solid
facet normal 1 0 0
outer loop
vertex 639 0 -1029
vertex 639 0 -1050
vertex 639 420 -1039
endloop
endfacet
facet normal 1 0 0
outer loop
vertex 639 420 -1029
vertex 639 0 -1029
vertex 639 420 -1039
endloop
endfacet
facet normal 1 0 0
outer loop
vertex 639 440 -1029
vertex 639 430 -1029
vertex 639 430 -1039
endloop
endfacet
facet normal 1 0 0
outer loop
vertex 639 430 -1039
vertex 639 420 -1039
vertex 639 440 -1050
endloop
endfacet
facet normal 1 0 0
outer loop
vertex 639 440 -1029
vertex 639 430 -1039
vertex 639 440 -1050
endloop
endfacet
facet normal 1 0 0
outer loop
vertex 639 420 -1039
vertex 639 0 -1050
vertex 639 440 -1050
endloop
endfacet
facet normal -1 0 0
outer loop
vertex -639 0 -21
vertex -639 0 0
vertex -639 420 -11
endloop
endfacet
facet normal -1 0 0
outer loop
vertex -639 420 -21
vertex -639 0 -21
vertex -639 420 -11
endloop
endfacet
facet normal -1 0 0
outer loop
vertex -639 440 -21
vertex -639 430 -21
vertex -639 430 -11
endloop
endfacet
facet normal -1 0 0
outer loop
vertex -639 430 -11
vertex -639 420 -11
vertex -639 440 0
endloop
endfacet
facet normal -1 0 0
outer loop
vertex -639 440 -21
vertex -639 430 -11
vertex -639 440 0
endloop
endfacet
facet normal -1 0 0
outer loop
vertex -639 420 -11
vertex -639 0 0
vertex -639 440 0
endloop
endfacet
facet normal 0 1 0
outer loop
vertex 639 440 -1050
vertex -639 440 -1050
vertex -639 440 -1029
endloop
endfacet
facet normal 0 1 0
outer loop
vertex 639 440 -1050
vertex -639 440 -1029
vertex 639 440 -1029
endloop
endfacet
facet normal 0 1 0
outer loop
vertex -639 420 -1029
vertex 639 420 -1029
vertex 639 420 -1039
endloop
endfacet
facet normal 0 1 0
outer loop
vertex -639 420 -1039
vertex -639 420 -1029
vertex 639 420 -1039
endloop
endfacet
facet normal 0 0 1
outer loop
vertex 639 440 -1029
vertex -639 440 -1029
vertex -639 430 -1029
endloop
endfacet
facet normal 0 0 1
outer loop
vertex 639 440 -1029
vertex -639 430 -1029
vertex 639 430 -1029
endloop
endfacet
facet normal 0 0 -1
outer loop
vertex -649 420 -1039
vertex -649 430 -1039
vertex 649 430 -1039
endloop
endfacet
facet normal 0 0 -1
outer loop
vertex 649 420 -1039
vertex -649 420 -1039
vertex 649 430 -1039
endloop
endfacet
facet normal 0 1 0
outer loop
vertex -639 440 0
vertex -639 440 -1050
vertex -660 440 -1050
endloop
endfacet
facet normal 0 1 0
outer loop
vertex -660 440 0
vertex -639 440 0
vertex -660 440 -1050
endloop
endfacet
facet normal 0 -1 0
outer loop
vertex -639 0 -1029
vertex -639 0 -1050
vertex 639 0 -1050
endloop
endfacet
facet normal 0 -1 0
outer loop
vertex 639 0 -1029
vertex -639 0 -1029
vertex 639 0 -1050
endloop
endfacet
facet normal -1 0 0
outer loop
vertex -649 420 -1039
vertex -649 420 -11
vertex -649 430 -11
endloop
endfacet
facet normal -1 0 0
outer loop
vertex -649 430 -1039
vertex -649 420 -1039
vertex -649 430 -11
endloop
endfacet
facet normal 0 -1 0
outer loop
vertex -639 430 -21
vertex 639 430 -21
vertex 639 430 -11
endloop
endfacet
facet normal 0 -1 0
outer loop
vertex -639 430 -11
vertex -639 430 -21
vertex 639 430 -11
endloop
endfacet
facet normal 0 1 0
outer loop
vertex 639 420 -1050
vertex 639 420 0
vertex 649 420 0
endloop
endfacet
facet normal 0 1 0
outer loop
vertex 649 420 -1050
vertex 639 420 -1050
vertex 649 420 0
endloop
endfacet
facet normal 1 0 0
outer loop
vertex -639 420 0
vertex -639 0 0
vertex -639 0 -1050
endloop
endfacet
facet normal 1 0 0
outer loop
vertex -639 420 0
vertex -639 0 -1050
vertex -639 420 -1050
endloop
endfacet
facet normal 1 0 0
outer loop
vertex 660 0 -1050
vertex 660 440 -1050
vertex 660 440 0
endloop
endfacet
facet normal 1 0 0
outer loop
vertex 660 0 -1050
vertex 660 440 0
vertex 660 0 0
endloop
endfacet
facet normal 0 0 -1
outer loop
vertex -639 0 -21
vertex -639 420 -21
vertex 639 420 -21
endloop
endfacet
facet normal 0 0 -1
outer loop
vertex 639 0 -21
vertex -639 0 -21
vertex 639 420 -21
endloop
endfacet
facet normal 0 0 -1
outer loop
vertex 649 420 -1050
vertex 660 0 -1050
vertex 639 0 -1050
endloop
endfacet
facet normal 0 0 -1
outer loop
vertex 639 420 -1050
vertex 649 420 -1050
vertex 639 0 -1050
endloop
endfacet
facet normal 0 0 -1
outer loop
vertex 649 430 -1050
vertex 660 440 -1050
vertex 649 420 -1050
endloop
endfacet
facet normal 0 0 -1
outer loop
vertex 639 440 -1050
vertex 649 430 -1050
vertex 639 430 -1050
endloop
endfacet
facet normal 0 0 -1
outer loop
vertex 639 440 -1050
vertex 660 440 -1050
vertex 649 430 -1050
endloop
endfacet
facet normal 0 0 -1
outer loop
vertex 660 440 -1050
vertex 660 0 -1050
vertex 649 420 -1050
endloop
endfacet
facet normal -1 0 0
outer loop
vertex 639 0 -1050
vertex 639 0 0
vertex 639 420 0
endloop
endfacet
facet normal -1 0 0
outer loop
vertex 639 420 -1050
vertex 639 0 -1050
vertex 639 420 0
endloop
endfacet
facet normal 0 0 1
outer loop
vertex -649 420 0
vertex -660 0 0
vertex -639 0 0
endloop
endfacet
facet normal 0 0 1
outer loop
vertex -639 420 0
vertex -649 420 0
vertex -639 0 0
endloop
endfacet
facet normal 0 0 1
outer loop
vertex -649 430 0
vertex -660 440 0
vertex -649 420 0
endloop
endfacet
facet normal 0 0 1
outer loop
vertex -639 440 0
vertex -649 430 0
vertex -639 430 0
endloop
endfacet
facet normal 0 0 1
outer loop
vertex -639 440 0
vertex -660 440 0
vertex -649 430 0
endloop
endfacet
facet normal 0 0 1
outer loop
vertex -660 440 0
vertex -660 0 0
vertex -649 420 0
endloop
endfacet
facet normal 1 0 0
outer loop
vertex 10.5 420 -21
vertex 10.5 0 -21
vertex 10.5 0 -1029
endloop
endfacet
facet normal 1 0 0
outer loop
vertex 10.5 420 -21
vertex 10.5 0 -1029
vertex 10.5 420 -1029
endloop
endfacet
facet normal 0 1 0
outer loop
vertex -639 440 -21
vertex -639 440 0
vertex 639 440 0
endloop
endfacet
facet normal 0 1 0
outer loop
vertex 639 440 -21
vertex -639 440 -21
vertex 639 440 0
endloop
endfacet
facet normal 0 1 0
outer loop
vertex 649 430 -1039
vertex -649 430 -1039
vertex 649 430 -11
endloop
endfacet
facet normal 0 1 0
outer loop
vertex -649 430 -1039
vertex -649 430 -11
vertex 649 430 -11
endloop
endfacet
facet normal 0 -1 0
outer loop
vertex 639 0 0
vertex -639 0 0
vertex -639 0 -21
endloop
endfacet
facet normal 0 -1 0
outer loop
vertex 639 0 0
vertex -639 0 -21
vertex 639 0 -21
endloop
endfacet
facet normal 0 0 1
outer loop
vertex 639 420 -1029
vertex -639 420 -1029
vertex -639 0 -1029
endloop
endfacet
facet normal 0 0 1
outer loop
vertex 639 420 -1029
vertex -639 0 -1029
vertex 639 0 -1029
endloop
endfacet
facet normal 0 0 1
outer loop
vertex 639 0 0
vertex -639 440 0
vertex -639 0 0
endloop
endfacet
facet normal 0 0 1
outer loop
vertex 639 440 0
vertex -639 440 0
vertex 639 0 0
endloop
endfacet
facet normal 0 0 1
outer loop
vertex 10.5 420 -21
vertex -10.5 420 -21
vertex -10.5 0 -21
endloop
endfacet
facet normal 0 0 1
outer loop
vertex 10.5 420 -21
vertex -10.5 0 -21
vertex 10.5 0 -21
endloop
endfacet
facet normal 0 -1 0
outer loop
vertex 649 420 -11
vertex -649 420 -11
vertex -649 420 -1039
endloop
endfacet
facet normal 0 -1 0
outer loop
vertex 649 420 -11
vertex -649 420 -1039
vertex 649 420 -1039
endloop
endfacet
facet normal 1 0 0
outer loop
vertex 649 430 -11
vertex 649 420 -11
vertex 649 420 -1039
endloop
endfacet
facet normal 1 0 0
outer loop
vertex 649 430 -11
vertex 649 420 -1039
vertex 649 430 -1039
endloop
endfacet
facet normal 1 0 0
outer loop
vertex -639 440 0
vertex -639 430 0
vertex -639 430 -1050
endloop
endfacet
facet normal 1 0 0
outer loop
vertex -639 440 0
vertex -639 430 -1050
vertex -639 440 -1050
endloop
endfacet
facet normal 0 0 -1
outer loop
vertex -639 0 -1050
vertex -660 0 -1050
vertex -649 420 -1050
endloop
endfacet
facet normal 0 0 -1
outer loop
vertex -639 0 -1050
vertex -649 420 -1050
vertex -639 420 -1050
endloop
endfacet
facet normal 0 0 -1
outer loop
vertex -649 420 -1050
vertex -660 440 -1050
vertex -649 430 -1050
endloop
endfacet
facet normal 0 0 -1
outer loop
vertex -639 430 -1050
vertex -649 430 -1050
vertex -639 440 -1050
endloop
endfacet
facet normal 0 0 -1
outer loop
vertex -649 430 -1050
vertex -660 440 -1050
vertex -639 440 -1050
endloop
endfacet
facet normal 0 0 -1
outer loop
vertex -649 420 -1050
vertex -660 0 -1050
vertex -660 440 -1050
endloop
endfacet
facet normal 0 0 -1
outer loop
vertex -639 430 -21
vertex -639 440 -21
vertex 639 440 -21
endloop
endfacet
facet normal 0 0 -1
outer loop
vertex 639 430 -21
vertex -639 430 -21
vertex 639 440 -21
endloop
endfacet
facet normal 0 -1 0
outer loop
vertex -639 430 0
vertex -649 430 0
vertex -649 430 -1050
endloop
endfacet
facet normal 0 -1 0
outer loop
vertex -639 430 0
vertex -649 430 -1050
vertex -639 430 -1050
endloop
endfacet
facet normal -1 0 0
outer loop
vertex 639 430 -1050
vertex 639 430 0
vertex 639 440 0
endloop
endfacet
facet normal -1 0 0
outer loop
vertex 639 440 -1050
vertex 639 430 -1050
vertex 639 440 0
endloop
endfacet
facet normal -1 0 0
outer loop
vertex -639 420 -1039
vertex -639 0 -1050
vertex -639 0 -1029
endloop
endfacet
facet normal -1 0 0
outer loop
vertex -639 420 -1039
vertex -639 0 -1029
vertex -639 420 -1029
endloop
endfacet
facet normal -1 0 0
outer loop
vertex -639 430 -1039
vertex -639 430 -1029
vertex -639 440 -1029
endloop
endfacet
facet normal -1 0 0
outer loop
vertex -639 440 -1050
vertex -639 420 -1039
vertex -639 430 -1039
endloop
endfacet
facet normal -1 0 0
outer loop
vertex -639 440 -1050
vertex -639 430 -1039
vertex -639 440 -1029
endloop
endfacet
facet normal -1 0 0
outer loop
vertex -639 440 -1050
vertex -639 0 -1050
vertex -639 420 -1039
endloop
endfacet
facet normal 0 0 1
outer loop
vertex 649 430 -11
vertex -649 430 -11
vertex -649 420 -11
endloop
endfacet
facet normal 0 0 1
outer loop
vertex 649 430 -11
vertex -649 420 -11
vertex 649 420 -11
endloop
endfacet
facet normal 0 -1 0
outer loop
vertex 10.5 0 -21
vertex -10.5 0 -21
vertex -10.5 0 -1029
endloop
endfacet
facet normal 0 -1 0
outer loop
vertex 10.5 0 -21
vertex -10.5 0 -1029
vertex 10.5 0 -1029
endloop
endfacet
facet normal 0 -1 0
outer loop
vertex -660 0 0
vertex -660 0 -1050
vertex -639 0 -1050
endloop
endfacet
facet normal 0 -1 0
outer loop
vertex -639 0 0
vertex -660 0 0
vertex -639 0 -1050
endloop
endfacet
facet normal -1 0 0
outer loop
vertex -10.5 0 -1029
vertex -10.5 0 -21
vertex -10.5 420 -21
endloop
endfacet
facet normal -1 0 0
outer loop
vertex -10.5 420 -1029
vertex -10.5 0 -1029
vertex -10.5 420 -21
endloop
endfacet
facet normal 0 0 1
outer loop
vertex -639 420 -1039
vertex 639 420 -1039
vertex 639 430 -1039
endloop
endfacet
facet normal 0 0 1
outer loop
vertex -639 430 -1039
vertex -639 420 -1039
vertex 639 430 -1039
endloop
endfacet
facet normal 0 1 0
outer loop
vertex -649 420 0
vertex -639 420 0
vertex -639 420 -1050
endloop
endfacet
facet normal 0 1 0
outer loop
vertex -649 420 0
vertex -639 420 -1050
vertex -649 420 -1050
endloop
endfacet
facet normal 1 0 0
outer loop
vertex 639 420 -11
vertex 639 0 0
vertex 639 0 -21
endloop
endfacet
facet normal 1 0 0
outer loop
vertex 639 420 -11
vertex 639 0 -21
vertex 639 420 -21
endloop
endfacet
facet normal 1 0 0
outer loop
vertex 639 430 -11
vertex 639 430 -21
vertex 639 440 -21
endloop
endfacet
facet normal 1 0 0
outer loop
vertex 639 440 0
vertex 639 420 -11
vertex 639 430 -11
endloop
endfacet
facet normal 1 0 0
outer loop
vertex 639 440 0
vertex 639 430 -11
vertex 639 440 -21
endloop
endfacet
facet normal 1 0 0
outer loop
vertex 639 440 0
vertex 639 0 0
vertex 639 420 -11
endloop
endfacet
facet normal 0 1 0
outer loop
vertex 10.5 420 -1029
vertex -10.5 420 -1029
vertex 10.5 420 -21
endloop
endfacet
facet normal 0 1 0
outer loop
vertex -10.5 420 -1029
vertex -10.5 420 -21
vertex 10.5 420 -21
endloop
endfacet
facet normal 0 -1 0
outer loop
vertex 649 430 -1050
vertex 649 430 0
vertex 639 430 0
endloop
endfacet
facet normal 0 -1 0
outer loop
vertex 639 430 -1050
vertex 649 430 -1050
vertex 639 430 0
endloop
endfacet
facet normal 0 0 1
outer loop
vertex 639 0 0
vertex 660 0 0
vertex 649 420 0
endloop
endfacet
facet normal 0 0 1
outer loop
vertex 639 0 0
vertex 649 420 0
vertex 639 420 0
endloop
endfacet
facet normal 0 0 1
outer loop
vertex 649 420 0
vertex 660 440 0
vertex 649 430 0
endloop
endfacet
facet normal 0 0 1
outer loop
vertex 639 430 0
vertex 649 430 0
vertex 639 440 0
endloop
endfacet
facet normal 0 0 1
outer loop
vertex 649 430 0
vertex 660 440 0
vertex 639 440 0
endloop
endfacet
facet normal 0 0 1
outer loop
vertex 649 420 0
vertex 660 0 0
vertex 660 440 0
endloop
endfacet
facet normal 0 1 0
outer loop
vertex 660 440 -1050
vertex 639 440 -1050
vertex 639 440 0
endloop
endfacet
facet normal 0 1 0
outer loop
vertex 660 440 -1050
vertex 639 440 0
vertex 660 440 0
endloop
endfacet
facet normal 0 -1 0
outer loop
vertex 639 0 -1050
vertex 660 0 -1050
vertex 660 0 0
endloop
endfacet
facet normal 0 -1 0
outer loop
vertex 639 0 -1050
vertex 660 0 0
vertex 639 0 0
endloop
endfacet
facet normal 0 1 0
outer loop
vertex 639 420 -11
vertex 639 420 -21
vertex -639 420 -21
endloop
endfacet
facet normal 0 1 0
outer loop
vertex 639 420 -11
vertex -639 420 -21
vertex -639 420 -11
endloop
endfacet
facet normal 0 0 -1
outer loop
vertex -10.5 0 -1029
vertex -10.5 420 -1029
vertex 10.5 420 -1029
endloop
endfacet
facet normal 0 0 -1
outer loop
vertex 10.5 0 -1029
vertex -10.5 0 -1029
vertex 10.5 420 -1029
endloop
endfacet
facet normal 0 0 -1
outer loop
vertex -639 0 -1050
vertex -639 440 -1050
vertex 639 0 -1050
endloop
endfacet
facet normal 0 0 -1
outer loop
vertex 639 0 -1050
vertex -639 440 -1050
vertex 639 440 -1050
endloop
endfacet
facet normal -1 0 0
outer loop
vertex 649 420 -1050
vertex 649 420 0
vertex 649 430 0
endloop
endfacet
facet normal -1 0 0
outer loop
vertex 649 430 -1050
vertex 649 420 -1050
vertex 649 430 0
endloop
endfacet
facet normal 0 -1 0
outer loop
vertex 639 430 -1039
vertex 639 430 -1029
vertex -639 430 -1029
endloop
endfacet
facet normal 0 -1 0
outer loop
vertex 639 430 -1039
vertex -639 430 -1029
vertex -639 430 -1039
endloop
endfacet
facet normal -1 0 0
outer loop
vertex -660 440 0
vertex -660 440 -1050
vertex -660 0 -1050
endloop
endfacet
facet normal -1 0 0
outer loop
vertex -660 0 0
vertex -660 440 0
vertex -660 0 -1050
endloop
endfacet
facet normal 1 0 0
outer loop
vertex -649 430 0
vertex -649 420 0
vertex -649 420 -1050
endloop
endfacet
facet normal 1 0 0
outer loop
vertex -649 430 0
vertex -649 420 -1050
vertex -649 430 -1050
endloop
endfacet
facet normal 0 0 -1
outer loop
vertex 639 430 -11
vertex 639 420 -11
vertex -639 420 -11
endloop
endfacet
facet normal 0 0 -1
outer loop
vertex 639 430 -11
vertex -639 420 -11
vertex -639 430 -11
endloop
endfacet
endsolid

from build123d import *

# Parameters (mm, degrees)
F4_DEPTH       = 1050
F6_W           = 1278
F6_H           = 440
F7_DEPTH       = 21
F8_W           = 10
F8_H           = 10
F9_DEPTH       = 1278
F12_W          = 21
F12_H          = 420
F13_DEPTH      = 504
F13_DEPTH_BACK = 504
F14_W          = 1298
F14_H          = 10
F15_DEPTH      = 514
F15_DEPTH_BACK = 514


with BuildPart() as f4:
    # F3 (on Top) → F4 (new body, through all)
    with BuildSketch(Plane.XY):
        Polygon((-639, 440), (-660, 440), (-660, 0), (-639, 0), (-639, 420), (-649, 420), (-649, 430), (-639, 430), align=None)
    extrude(amount=-F4_DEPTH)


with BuildPart() as f5_1:
    # F5: instance of F4
    add(f4.part.mirror(Plane.YZ))


with BuildPart() as f7:
    # F6 (on Top) → F7 (new body)
    with BuildSketch(Plane.XY):
        with Locations((0, 220)):
            Rectangle(F6_W, F6_H)
    extrude(amount=-F7_DEPTH)

    # F8 (on face) → F9 (cut, through all)
    with BuildSketch(Plane.YZ.offset(639)):
        with Locations((425, -16)):
            Rectangle(F8_W, F8_H)
    extrude(amount=-F9_DEPTH, mode=Mode.SUBTRACT)


with BuildPart() as f11_1:
    # F11: instance of F7
    add(f7.part.mirror(Plane.XY.offset(-525)))


with BuildPart() as f13:
    # F12 (on offset) → F13 (new body, two sides)
    with BuildSketch(Plane.XY.offset(-525)) as f13_sk:
        with Locations((0, 210)):
            Rectangle(F12_W, F12_H)
    extrude(amount=F13_DEPTH)
    extrude(f13_sk.sketch, amount=-F13_DEPTH_BACK)


with BuildPart() as f15:
    # F14 (on offset) → F15 (new body, two sides)
    with BuildSketch(Plane.XY.offset(-525)) as f15_sk:
        with Locations((0, 425)):
            Rectangle(F14_W, F14_H)
    extrude(amount=F15_DEPTH)
    extrude(f15_sk.sketch, amount=-F15_DEPTH_BACK)


solid = Compound([f4.part, f5_1.part, f7.part, f11_1.part, f13.part, f15.part])
